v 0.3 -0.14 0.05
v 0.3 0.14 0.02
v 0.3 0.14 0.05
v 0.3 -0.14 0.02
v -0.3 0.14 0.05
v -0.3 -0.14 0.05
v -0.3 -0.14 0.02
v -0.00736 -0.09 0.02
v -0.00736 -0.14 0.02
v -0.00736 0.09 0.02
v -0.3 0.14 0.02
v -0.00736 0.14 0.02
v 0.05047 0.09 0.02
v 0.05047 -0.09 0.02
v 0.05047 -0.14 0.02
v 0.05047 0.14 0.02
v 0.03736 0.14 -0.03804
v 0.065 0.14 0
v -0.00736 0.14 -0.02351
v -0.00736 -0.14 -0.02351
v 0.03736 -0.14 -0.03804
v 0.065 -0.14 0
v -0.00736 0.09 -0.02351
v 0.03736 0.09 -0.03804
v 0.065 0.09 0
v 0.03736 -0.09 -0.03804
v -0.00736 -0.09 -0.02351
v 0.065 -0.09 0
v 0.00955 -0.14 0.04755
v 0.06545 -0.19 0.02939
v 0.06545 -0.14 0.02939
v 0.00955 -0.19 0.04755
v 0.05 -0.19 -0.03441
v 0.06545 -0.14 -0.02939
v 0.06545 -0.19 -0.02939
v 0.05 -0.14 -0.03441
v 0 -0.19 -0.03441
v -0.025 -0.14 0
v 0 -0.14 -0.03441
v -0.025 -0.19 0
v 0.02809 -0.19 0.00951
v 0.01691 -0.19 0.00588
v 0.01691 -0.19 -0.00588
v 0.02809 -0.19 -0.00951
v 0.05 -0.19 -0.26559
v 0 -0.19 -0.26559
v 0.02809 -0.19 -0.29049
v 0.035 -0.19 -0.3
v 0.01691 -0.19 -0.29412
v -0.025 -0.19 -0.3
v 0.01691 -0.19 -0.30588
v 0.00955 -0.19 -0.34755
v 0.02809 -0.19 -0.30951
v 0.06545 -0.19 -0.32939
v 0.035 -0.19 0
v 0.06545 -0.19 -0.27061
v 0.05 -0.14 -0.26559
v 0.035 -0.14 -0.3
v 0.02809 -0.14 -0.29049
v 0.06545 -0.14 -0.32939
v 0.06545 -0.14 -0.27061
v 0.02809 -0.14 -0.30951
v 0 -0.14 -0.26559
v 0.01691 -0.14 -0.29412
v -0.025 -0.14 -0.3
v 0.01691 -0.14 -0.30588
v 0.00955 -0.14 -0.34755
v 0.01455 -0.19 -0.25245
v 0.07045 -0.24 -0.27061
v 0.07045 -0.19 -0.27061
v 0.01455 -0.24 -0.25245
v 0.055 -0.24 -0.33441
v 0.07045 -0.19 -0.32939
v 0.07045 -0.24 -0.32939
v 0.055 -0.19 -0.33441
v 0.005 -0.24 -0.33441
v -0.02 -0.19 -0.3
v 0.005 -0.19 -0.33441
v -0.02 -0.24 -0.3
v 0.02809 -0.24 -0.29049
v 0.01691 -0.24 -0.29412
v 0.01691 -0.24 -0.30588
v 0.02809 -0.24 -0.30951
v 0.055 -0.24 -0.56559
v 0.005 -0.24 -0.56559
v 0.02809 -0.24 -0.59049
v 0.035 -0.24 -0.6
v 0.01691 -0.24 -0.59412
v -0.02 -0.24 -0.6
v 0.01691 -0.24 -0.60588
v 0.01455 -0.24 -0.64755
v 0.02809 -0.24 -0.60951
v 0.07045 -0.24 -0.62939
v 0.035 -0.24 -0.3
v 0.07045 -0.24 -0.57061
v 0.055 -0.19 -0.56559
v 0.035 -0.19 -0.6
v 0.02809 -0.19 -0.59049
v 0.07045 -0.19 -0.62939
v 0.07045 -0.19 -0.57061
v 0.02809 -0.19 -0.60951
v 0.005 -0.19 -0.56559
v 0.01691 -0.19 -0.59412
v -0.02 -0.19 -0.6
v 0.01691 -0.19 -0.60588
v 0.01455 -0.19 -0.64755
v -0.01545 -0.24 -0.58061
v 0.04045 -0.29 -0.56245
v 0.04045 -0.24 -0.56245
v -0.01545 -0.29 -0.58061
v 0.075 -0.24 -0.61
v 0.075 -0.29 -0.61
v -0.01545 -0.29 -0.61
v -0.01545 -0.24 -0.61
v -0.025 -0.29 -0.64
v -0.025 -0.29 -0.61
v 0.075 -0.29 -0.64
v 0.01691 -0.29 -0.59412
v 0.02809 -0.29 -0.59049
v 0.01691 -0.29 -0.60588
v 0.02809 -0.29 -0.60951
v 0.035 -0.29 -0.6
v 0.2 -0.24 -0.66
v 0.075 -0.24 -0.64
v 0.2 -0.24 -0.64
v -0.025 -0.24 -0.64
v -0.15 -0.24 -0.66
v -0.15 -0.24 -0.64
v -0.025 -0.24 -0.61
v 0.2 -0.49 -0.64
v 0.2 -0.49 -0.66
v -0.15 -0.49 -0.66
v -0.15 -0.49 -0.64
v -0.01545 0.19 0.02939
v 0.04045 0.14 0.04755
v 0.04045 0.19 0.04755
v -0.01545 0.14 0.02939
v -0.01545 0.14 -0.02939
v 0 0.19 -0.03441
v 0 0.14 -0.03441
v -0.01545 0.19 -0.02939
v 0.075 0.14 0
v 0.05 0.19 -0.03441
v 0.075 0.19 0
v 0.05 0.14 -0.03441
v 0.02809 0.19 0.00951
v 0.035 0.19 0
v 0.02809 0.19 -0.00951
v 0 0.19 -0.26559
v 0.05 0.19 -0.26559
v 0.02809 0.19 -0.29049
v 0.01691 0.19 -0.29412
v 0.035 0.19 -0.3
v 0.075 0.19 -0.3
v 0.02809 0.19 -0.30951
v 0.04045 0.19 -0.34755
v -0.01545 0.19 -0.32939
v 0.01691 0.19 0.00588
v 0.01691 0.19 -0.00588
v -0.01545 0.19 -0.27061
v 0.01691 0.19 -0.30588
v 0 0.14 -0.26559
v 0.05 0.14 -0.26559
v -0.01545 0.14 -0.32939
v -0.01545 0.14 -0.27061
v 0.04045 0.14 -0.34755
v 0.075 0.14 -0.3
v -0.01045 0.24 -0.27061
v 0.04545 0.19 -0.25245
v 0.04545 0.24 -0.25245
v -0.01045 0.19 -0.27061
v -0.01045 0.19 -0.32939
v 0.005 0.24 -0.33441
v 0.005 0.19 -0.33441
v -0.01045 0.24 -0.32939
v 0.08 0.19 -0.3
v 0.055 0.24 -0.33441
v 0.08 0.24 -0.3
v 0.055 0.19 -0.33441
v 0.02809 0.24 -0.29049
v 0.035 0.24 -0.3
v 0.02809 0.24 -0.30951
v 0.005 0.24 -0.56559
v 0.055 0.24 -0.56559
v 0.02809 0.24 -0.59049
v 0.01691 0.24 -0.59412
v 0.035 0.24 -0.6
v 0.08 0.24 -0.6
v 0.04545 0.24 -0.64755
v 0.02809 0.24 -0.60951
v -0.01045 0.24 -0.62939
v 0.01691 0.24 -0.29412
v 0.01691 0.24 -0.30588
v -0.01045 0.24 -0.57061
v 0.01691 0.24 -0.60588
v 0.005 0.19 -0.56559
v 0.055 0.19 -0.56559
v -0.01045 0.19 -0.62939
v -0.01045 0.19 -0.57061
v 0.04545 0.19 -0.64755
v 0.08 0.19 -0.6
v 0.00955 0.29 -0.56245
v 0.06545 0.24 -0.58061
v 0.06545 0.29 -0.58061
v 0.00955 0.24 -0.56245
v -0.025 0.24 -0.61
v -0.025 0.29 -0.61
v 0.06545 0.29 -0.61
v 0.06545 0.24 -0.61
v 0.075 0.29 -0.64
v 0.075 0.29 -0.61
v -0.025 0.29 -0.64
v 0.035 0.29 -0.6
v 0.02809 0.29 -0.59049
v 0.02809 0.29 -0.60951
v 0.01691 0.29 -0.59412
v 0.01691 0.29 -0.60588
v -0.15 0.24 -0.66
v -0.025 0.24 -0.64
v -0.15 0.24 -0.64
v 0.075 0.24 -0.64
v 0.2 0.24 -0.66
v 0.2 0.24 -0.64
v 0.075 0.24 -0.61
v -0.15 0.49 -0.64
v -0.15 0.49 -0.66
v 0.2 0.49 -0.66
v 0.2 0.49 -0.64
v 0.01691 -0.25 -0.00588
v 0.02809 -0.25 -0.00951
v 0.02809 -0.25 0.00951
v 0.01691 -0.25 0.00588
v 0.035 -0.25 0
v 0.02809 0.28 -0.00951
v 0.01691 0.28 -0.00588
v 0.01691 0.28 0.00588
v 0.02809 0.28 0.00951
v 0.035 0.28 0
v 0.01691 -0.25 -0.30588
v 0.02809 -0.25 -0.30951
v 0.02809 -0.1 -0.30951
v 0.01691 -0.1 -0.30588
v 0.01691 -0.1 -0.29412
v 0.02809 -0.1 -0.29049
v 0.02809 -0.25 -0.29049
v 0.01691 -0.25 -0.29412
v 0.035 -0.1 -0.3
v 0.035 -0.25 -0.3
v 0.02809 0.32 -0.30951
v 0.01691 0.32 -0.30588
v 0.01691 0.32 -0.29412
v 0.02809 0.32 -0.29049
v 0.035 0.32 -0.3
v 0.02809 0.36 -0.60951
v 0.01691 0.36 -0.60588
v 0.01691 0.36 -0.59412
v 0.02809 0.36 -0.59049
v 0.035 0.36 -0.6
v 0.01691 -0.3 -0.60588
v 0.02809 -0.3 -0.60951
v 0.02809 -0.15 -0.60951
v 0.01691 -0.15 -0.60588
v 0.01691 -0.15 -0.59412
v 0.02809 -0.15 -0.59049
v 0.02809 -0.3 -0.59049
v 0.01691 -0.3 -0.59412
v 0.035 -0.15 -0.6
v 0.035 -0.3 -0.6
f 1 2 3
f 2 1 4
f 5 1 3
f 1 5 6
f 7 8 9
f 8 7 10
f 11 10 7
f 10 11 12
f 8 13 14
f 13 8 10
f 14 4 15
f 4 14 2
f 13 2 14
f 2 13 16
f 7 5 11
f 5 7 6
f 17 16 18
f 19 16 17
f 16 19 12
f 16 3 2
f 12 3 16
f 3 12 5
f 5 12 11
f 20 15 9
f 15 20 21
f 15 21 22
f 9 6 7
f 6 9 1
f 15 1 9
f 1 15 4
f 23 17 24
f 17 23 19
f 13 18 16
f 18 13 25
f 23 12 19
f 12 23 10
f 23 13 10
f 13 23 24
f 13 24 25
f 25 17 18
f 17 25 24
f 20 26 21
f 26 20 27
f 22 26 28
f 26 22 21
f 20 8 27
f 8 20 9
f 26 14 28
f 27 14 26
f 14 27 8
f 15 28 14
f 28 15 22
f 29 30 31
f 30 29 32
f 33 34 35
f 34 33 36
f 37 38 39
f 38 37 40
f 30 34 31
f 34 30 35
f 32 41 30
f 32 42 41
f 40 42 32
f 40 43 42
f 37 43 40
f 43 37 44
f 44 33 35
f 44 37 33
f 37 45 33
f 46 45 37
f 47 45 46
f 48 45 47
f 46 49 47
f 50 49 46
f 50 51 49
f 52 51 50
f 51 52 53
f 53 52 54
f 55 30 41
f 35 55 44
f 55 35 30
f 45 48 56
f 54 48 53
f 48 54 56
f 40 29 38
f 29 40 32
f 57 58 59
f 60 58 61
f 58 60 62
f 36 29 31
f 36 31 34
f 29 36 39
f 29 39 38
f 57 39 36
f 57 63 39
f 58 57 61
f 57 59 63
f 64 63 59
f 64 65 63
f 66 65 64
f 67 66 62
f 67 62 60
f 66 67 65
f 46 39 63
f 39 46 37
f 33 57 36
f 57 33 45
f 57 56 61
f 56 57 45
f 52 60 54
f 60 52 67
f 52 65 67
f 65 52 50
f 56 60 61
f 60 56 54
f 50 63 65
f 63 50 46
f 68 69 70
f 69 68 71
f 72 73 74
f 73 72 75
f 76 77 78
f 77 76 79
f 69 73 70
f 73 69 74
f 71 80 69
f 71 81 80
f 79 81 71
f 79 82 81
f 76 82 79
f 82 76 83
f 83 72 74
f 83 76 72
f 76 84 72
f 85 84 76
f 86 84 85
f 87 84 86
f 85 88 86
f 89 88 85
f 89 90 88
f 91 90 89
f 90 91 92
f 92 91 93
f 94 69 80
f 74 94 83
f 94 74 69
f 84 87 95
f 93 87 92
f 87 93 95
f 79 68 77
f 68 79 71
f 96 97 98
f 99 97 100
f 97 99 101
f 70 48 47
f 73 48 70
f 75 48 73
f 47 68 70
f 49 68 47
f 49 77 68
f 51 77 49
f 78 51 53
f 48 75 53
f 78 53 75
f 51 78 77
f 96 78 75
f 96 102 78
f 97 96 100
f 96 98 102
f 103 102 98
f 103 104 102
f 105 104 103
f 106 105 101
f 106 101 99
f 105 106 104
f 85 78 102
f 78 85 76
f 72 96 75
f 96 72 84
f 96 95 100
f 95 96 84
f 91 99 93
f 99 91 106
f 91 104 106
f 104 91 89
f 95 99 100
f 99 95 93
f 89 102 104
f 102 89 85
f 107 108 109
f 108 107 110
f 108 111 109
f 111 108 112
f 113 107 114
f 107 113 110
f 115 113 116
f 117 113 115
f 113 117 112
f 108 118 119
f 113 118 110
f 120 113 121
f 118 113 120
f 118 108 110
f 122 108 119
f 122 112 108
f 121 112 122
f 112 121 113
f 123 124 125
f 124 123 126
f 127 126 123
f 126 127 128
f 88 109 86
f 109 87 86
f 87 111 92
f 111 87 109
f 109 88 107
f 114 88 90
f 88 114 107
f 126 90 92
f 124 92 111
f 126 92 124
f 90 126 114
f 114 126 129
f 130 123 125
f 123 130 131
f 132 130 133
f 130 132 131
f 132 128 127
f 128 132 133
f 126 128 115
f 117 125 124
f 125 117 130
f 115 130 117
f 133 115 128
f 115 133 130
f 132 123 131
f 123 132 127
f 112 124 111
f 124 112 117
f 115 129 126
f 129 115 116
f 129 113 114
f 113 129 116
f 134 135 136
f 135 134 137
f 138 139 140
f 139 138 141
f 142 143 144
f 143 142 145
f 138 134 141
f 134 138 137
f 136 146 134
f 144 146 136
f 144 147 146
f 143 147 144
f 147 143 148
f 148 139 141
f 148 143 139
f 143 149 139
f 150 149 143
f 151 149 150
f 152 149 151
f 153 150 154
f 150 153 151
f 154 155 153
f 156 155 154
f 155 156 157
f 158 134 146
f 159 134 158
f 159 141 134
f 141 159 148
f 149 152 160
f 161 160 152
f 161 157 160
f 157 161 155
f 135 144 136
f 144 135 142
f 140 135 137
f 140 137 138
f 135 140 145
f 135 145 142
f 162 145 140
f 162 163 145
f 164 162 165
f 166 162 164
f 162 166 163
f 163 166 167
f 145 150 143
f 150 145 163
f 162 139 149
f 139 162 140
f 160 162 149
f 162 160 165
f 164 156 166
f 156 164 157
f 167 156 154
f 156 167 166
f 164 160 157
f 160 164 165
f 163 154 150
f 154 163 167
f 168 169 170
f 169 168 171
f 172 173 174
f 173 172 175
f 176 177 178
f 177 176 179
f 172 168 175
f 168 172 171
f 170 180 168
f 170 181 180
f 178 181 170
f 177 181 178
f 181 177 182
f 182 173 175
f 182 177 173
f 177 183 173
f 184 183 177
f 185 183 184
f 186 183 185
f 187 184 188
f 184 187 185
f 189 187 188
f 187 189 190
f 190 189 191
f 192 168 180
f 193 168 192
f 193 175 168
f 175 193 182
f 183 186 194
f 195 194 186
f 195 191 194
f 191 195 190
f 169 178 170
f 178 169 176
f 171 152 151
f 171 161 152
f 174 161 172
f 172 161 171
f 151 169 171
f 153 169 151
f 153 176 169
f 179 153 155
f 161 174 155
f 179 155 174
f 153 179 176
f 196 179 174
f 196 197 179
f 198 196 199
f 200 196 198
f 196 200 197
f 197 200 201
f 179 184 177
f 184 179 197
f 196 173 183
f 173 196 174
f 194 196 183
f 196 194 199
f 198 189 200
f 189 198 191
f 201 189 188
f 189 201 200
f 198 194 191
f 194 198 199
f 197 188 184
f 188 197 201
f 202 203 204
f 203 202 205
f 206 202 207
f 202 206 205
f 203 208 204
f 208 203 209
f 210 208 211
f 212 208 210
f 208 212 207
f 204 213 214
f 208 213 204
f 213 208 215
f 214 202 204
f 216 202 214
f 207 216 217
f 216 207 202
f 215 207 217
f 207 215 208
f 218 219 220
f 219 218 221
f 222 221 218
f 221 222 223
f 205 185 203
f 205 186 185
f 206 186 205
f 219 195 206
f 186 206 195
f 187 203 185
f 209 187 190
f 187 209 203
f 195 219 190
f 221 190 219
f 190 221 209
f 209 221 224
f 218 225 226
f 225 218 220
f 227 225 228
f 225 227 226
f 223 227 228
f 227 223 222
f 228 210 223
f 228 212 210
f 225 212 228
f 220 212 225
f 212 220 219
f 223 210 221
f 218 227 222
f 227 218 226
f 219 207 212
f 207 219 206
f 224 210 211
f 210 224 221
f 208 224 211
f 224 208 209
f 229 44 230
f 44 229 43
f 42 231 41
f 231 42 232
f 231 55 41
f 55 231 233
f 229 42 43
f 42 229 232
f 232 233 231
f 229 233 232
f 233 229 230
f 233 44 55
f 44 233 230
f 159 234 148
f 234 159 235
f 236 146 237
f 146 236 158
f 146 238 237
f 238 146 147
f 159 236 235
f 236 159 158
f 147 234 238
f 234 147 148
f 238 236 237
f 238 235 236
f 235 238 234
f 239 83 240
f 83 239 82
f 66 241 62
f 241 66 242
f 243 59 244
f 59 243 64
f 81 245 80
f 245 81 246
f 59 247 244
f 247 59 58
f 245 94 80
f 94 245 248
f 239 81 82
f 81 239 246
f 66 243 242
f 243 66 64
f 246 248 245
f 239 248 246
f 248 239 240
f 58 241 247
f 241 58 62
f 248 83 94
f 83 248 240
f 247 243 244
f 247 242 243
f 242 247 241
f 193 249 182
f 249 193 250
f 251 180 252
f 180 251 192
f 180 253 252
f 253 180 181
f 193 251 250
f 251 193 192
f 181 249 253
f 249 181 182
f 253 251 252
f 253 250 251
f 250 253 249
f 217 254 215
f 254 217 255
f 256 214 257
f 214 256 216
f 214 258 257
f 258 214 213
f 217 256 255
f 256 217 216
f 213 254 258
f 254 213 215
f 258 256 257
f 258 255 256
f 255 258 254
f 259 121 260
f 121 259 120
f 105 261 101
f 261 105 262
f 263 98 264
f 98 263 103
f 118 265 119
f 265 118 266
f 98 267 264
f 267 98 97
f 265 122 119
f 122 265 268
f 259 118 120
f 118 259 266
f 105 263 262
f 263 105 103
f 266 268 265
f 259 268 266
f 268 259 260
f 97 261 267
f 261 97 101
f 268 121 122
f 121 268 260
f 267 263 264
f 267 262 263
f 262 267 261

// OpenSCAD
// CSG.scad - Basic example of CSG usage

//link: hip
translate([0,0,0])
{
    color([0.3,0.3,0.5])
    union()
    {
        translate([-0.30,-0.14,0.02])
        {
            cube([0.60,0.28,0.03]);
        }
        
        translate([0.025,0.14,0.0])
        {
            rotate([90,0,0])
            {
                cylinder(h=0.05,r=0.04);
            }
        }
        translate([0.025,-0.14,0.0])
        {
            rotate([-90,0,0])
            {
                cylinder(h=0.05,r=0.04);
            }
        }
        

    }

}


//link: rightthigh
translate([0.025,-0.14,0.0])
{
    color([1,1,0])
    rotate([-90,0,180]) 
    union() {
        
        cylinder(h=0.05,r=0.05);
        
        translate([-0.025,0,0]) {
        cube([0.05,0.3,0.05]);
        }
        
    
        translate([0,0.3,0.0]) {
        cylinder(h=0.05,r=0.05);
        }
        
    }
}

//link: rightfemur
translate([0.03,-0.19,-0.30])
{
    color([1,0,0])
    rotate([-90,0,180]) 
    union() {
        
        cylinder(h=0.05,r=0.05);
        
        translate([-0.025,0,0]) {
        cube([0.05,0.3,0.05]);
        }
        
    
        translate([0,0.3,0.0]) {
        cylinder(h=0.05,r=0.05);
        }
        
    }
}

//link: rightfoot
translate ([0.025,-0.24,-0.61])
{
    color([0,0,1])
    rotate([90,0,0]) {
    union()
    {
        cylinder(h=0.05,r=0.05);
        translate([-0.175,-0.05,0]) {
        cube([0.35,0.02,0.25]);
        }
        translate([-0.05,-0.05,0]) {
            cube([0.10,0.05,0.05]);
        }
    }
}
}


//link: leftthigh
translate([0.025,0.14,0.0])
{
    color([0,0,1])
    rotate([-90,0,0]) 
    union() {
        
        cylinder(h=0.05,r=0.05);
        
        translate([-0.025,0,0]) {
        cube([0.05,0.3,0.05]);
        }
        
    
        translate([0,0.3,0.0]) {
        cylinder(h=0.05,r=0.05);
        }
        
    }
}




//link: leftfemur
translate([0.03,0.19,-0.30])
{
    color([0,0,1])
    rotate([-90,0,0]) 
    union() {
        
        cylinder(h=0.05,r=0.05);
        
        translate([-0.025,0,0]) {
        cube([0.05,0.3,0.05]);
        }
        
    
        translate([0,0.3,0.0]) {
        cylinder(h=0.05,r=0.05);
        }
        
    }
}



//link: leftfoot
translate ([0.025,0.24,-0.61])
{
    color([0,1,0])
    rotate([-90,180,0]) {
    union()
    {
        cylinder(h=0.05,r=0.05);
        translate([-0.175,-0.05,0]) {
        cube([0.35,0.02,0.25]);
        }
        translate([-0.05,-0.05,0]) {
            cube([0.10,0.05,0.05]);
        }
    }
}
}



//join: hip,rightthigh
translate([0.025,-0.15,0.0])
{
    color([0.5,0.5,0.5]);
    union()
    {
        rotate([90,0,0])
        {
            cylinder(h=0.1,r=0.01);
        }
    }
}

//join: hip,leftthigh
translate([0.025,0.28,0.0])
{
   color([0.5,0.5,0.5]);
    union()
    {
        rotate([90,0,0])
        {
            cylinder(h=0.1,r=0.01);
        }

    }
}

//join: rightthigh,rightfemur
translate([0.025,-0.1,-0.30])
{
   color([0.5,0.5,0.5]);
    union()
    {
        rotate([90,0,0])
        {
            cylinder(h=0.15,r=0.01);
        }

    }
}

//join: leftthigh,leftfemur
translate([0.025,0.32,-0.30])
{
   color([0.5,0.5,0.5]);
    union()
    {
        rotate([90,0,0])
        {
            cylinder(h=0.15,r=0.01);
        }

    }
}

//join: rightfemur,rightfoot
translate([0.025,0.36,-0.6])
{
   color([0.5,0.5,0.5]);
    union()
    {
        rotate([90,0,0])
        {
            cylinder(h=0.15,r=0.01);
        }

    }
}

//join: leftfemur,leftfoot 
translate([0.025,-0.15,-0.6])
{
   color([0.5,0.5,0.5]);
    union()
    {
        rotate([90,0,0])
        {
            cylinder(h=0.15,r=0.01);
        }

    }
}
